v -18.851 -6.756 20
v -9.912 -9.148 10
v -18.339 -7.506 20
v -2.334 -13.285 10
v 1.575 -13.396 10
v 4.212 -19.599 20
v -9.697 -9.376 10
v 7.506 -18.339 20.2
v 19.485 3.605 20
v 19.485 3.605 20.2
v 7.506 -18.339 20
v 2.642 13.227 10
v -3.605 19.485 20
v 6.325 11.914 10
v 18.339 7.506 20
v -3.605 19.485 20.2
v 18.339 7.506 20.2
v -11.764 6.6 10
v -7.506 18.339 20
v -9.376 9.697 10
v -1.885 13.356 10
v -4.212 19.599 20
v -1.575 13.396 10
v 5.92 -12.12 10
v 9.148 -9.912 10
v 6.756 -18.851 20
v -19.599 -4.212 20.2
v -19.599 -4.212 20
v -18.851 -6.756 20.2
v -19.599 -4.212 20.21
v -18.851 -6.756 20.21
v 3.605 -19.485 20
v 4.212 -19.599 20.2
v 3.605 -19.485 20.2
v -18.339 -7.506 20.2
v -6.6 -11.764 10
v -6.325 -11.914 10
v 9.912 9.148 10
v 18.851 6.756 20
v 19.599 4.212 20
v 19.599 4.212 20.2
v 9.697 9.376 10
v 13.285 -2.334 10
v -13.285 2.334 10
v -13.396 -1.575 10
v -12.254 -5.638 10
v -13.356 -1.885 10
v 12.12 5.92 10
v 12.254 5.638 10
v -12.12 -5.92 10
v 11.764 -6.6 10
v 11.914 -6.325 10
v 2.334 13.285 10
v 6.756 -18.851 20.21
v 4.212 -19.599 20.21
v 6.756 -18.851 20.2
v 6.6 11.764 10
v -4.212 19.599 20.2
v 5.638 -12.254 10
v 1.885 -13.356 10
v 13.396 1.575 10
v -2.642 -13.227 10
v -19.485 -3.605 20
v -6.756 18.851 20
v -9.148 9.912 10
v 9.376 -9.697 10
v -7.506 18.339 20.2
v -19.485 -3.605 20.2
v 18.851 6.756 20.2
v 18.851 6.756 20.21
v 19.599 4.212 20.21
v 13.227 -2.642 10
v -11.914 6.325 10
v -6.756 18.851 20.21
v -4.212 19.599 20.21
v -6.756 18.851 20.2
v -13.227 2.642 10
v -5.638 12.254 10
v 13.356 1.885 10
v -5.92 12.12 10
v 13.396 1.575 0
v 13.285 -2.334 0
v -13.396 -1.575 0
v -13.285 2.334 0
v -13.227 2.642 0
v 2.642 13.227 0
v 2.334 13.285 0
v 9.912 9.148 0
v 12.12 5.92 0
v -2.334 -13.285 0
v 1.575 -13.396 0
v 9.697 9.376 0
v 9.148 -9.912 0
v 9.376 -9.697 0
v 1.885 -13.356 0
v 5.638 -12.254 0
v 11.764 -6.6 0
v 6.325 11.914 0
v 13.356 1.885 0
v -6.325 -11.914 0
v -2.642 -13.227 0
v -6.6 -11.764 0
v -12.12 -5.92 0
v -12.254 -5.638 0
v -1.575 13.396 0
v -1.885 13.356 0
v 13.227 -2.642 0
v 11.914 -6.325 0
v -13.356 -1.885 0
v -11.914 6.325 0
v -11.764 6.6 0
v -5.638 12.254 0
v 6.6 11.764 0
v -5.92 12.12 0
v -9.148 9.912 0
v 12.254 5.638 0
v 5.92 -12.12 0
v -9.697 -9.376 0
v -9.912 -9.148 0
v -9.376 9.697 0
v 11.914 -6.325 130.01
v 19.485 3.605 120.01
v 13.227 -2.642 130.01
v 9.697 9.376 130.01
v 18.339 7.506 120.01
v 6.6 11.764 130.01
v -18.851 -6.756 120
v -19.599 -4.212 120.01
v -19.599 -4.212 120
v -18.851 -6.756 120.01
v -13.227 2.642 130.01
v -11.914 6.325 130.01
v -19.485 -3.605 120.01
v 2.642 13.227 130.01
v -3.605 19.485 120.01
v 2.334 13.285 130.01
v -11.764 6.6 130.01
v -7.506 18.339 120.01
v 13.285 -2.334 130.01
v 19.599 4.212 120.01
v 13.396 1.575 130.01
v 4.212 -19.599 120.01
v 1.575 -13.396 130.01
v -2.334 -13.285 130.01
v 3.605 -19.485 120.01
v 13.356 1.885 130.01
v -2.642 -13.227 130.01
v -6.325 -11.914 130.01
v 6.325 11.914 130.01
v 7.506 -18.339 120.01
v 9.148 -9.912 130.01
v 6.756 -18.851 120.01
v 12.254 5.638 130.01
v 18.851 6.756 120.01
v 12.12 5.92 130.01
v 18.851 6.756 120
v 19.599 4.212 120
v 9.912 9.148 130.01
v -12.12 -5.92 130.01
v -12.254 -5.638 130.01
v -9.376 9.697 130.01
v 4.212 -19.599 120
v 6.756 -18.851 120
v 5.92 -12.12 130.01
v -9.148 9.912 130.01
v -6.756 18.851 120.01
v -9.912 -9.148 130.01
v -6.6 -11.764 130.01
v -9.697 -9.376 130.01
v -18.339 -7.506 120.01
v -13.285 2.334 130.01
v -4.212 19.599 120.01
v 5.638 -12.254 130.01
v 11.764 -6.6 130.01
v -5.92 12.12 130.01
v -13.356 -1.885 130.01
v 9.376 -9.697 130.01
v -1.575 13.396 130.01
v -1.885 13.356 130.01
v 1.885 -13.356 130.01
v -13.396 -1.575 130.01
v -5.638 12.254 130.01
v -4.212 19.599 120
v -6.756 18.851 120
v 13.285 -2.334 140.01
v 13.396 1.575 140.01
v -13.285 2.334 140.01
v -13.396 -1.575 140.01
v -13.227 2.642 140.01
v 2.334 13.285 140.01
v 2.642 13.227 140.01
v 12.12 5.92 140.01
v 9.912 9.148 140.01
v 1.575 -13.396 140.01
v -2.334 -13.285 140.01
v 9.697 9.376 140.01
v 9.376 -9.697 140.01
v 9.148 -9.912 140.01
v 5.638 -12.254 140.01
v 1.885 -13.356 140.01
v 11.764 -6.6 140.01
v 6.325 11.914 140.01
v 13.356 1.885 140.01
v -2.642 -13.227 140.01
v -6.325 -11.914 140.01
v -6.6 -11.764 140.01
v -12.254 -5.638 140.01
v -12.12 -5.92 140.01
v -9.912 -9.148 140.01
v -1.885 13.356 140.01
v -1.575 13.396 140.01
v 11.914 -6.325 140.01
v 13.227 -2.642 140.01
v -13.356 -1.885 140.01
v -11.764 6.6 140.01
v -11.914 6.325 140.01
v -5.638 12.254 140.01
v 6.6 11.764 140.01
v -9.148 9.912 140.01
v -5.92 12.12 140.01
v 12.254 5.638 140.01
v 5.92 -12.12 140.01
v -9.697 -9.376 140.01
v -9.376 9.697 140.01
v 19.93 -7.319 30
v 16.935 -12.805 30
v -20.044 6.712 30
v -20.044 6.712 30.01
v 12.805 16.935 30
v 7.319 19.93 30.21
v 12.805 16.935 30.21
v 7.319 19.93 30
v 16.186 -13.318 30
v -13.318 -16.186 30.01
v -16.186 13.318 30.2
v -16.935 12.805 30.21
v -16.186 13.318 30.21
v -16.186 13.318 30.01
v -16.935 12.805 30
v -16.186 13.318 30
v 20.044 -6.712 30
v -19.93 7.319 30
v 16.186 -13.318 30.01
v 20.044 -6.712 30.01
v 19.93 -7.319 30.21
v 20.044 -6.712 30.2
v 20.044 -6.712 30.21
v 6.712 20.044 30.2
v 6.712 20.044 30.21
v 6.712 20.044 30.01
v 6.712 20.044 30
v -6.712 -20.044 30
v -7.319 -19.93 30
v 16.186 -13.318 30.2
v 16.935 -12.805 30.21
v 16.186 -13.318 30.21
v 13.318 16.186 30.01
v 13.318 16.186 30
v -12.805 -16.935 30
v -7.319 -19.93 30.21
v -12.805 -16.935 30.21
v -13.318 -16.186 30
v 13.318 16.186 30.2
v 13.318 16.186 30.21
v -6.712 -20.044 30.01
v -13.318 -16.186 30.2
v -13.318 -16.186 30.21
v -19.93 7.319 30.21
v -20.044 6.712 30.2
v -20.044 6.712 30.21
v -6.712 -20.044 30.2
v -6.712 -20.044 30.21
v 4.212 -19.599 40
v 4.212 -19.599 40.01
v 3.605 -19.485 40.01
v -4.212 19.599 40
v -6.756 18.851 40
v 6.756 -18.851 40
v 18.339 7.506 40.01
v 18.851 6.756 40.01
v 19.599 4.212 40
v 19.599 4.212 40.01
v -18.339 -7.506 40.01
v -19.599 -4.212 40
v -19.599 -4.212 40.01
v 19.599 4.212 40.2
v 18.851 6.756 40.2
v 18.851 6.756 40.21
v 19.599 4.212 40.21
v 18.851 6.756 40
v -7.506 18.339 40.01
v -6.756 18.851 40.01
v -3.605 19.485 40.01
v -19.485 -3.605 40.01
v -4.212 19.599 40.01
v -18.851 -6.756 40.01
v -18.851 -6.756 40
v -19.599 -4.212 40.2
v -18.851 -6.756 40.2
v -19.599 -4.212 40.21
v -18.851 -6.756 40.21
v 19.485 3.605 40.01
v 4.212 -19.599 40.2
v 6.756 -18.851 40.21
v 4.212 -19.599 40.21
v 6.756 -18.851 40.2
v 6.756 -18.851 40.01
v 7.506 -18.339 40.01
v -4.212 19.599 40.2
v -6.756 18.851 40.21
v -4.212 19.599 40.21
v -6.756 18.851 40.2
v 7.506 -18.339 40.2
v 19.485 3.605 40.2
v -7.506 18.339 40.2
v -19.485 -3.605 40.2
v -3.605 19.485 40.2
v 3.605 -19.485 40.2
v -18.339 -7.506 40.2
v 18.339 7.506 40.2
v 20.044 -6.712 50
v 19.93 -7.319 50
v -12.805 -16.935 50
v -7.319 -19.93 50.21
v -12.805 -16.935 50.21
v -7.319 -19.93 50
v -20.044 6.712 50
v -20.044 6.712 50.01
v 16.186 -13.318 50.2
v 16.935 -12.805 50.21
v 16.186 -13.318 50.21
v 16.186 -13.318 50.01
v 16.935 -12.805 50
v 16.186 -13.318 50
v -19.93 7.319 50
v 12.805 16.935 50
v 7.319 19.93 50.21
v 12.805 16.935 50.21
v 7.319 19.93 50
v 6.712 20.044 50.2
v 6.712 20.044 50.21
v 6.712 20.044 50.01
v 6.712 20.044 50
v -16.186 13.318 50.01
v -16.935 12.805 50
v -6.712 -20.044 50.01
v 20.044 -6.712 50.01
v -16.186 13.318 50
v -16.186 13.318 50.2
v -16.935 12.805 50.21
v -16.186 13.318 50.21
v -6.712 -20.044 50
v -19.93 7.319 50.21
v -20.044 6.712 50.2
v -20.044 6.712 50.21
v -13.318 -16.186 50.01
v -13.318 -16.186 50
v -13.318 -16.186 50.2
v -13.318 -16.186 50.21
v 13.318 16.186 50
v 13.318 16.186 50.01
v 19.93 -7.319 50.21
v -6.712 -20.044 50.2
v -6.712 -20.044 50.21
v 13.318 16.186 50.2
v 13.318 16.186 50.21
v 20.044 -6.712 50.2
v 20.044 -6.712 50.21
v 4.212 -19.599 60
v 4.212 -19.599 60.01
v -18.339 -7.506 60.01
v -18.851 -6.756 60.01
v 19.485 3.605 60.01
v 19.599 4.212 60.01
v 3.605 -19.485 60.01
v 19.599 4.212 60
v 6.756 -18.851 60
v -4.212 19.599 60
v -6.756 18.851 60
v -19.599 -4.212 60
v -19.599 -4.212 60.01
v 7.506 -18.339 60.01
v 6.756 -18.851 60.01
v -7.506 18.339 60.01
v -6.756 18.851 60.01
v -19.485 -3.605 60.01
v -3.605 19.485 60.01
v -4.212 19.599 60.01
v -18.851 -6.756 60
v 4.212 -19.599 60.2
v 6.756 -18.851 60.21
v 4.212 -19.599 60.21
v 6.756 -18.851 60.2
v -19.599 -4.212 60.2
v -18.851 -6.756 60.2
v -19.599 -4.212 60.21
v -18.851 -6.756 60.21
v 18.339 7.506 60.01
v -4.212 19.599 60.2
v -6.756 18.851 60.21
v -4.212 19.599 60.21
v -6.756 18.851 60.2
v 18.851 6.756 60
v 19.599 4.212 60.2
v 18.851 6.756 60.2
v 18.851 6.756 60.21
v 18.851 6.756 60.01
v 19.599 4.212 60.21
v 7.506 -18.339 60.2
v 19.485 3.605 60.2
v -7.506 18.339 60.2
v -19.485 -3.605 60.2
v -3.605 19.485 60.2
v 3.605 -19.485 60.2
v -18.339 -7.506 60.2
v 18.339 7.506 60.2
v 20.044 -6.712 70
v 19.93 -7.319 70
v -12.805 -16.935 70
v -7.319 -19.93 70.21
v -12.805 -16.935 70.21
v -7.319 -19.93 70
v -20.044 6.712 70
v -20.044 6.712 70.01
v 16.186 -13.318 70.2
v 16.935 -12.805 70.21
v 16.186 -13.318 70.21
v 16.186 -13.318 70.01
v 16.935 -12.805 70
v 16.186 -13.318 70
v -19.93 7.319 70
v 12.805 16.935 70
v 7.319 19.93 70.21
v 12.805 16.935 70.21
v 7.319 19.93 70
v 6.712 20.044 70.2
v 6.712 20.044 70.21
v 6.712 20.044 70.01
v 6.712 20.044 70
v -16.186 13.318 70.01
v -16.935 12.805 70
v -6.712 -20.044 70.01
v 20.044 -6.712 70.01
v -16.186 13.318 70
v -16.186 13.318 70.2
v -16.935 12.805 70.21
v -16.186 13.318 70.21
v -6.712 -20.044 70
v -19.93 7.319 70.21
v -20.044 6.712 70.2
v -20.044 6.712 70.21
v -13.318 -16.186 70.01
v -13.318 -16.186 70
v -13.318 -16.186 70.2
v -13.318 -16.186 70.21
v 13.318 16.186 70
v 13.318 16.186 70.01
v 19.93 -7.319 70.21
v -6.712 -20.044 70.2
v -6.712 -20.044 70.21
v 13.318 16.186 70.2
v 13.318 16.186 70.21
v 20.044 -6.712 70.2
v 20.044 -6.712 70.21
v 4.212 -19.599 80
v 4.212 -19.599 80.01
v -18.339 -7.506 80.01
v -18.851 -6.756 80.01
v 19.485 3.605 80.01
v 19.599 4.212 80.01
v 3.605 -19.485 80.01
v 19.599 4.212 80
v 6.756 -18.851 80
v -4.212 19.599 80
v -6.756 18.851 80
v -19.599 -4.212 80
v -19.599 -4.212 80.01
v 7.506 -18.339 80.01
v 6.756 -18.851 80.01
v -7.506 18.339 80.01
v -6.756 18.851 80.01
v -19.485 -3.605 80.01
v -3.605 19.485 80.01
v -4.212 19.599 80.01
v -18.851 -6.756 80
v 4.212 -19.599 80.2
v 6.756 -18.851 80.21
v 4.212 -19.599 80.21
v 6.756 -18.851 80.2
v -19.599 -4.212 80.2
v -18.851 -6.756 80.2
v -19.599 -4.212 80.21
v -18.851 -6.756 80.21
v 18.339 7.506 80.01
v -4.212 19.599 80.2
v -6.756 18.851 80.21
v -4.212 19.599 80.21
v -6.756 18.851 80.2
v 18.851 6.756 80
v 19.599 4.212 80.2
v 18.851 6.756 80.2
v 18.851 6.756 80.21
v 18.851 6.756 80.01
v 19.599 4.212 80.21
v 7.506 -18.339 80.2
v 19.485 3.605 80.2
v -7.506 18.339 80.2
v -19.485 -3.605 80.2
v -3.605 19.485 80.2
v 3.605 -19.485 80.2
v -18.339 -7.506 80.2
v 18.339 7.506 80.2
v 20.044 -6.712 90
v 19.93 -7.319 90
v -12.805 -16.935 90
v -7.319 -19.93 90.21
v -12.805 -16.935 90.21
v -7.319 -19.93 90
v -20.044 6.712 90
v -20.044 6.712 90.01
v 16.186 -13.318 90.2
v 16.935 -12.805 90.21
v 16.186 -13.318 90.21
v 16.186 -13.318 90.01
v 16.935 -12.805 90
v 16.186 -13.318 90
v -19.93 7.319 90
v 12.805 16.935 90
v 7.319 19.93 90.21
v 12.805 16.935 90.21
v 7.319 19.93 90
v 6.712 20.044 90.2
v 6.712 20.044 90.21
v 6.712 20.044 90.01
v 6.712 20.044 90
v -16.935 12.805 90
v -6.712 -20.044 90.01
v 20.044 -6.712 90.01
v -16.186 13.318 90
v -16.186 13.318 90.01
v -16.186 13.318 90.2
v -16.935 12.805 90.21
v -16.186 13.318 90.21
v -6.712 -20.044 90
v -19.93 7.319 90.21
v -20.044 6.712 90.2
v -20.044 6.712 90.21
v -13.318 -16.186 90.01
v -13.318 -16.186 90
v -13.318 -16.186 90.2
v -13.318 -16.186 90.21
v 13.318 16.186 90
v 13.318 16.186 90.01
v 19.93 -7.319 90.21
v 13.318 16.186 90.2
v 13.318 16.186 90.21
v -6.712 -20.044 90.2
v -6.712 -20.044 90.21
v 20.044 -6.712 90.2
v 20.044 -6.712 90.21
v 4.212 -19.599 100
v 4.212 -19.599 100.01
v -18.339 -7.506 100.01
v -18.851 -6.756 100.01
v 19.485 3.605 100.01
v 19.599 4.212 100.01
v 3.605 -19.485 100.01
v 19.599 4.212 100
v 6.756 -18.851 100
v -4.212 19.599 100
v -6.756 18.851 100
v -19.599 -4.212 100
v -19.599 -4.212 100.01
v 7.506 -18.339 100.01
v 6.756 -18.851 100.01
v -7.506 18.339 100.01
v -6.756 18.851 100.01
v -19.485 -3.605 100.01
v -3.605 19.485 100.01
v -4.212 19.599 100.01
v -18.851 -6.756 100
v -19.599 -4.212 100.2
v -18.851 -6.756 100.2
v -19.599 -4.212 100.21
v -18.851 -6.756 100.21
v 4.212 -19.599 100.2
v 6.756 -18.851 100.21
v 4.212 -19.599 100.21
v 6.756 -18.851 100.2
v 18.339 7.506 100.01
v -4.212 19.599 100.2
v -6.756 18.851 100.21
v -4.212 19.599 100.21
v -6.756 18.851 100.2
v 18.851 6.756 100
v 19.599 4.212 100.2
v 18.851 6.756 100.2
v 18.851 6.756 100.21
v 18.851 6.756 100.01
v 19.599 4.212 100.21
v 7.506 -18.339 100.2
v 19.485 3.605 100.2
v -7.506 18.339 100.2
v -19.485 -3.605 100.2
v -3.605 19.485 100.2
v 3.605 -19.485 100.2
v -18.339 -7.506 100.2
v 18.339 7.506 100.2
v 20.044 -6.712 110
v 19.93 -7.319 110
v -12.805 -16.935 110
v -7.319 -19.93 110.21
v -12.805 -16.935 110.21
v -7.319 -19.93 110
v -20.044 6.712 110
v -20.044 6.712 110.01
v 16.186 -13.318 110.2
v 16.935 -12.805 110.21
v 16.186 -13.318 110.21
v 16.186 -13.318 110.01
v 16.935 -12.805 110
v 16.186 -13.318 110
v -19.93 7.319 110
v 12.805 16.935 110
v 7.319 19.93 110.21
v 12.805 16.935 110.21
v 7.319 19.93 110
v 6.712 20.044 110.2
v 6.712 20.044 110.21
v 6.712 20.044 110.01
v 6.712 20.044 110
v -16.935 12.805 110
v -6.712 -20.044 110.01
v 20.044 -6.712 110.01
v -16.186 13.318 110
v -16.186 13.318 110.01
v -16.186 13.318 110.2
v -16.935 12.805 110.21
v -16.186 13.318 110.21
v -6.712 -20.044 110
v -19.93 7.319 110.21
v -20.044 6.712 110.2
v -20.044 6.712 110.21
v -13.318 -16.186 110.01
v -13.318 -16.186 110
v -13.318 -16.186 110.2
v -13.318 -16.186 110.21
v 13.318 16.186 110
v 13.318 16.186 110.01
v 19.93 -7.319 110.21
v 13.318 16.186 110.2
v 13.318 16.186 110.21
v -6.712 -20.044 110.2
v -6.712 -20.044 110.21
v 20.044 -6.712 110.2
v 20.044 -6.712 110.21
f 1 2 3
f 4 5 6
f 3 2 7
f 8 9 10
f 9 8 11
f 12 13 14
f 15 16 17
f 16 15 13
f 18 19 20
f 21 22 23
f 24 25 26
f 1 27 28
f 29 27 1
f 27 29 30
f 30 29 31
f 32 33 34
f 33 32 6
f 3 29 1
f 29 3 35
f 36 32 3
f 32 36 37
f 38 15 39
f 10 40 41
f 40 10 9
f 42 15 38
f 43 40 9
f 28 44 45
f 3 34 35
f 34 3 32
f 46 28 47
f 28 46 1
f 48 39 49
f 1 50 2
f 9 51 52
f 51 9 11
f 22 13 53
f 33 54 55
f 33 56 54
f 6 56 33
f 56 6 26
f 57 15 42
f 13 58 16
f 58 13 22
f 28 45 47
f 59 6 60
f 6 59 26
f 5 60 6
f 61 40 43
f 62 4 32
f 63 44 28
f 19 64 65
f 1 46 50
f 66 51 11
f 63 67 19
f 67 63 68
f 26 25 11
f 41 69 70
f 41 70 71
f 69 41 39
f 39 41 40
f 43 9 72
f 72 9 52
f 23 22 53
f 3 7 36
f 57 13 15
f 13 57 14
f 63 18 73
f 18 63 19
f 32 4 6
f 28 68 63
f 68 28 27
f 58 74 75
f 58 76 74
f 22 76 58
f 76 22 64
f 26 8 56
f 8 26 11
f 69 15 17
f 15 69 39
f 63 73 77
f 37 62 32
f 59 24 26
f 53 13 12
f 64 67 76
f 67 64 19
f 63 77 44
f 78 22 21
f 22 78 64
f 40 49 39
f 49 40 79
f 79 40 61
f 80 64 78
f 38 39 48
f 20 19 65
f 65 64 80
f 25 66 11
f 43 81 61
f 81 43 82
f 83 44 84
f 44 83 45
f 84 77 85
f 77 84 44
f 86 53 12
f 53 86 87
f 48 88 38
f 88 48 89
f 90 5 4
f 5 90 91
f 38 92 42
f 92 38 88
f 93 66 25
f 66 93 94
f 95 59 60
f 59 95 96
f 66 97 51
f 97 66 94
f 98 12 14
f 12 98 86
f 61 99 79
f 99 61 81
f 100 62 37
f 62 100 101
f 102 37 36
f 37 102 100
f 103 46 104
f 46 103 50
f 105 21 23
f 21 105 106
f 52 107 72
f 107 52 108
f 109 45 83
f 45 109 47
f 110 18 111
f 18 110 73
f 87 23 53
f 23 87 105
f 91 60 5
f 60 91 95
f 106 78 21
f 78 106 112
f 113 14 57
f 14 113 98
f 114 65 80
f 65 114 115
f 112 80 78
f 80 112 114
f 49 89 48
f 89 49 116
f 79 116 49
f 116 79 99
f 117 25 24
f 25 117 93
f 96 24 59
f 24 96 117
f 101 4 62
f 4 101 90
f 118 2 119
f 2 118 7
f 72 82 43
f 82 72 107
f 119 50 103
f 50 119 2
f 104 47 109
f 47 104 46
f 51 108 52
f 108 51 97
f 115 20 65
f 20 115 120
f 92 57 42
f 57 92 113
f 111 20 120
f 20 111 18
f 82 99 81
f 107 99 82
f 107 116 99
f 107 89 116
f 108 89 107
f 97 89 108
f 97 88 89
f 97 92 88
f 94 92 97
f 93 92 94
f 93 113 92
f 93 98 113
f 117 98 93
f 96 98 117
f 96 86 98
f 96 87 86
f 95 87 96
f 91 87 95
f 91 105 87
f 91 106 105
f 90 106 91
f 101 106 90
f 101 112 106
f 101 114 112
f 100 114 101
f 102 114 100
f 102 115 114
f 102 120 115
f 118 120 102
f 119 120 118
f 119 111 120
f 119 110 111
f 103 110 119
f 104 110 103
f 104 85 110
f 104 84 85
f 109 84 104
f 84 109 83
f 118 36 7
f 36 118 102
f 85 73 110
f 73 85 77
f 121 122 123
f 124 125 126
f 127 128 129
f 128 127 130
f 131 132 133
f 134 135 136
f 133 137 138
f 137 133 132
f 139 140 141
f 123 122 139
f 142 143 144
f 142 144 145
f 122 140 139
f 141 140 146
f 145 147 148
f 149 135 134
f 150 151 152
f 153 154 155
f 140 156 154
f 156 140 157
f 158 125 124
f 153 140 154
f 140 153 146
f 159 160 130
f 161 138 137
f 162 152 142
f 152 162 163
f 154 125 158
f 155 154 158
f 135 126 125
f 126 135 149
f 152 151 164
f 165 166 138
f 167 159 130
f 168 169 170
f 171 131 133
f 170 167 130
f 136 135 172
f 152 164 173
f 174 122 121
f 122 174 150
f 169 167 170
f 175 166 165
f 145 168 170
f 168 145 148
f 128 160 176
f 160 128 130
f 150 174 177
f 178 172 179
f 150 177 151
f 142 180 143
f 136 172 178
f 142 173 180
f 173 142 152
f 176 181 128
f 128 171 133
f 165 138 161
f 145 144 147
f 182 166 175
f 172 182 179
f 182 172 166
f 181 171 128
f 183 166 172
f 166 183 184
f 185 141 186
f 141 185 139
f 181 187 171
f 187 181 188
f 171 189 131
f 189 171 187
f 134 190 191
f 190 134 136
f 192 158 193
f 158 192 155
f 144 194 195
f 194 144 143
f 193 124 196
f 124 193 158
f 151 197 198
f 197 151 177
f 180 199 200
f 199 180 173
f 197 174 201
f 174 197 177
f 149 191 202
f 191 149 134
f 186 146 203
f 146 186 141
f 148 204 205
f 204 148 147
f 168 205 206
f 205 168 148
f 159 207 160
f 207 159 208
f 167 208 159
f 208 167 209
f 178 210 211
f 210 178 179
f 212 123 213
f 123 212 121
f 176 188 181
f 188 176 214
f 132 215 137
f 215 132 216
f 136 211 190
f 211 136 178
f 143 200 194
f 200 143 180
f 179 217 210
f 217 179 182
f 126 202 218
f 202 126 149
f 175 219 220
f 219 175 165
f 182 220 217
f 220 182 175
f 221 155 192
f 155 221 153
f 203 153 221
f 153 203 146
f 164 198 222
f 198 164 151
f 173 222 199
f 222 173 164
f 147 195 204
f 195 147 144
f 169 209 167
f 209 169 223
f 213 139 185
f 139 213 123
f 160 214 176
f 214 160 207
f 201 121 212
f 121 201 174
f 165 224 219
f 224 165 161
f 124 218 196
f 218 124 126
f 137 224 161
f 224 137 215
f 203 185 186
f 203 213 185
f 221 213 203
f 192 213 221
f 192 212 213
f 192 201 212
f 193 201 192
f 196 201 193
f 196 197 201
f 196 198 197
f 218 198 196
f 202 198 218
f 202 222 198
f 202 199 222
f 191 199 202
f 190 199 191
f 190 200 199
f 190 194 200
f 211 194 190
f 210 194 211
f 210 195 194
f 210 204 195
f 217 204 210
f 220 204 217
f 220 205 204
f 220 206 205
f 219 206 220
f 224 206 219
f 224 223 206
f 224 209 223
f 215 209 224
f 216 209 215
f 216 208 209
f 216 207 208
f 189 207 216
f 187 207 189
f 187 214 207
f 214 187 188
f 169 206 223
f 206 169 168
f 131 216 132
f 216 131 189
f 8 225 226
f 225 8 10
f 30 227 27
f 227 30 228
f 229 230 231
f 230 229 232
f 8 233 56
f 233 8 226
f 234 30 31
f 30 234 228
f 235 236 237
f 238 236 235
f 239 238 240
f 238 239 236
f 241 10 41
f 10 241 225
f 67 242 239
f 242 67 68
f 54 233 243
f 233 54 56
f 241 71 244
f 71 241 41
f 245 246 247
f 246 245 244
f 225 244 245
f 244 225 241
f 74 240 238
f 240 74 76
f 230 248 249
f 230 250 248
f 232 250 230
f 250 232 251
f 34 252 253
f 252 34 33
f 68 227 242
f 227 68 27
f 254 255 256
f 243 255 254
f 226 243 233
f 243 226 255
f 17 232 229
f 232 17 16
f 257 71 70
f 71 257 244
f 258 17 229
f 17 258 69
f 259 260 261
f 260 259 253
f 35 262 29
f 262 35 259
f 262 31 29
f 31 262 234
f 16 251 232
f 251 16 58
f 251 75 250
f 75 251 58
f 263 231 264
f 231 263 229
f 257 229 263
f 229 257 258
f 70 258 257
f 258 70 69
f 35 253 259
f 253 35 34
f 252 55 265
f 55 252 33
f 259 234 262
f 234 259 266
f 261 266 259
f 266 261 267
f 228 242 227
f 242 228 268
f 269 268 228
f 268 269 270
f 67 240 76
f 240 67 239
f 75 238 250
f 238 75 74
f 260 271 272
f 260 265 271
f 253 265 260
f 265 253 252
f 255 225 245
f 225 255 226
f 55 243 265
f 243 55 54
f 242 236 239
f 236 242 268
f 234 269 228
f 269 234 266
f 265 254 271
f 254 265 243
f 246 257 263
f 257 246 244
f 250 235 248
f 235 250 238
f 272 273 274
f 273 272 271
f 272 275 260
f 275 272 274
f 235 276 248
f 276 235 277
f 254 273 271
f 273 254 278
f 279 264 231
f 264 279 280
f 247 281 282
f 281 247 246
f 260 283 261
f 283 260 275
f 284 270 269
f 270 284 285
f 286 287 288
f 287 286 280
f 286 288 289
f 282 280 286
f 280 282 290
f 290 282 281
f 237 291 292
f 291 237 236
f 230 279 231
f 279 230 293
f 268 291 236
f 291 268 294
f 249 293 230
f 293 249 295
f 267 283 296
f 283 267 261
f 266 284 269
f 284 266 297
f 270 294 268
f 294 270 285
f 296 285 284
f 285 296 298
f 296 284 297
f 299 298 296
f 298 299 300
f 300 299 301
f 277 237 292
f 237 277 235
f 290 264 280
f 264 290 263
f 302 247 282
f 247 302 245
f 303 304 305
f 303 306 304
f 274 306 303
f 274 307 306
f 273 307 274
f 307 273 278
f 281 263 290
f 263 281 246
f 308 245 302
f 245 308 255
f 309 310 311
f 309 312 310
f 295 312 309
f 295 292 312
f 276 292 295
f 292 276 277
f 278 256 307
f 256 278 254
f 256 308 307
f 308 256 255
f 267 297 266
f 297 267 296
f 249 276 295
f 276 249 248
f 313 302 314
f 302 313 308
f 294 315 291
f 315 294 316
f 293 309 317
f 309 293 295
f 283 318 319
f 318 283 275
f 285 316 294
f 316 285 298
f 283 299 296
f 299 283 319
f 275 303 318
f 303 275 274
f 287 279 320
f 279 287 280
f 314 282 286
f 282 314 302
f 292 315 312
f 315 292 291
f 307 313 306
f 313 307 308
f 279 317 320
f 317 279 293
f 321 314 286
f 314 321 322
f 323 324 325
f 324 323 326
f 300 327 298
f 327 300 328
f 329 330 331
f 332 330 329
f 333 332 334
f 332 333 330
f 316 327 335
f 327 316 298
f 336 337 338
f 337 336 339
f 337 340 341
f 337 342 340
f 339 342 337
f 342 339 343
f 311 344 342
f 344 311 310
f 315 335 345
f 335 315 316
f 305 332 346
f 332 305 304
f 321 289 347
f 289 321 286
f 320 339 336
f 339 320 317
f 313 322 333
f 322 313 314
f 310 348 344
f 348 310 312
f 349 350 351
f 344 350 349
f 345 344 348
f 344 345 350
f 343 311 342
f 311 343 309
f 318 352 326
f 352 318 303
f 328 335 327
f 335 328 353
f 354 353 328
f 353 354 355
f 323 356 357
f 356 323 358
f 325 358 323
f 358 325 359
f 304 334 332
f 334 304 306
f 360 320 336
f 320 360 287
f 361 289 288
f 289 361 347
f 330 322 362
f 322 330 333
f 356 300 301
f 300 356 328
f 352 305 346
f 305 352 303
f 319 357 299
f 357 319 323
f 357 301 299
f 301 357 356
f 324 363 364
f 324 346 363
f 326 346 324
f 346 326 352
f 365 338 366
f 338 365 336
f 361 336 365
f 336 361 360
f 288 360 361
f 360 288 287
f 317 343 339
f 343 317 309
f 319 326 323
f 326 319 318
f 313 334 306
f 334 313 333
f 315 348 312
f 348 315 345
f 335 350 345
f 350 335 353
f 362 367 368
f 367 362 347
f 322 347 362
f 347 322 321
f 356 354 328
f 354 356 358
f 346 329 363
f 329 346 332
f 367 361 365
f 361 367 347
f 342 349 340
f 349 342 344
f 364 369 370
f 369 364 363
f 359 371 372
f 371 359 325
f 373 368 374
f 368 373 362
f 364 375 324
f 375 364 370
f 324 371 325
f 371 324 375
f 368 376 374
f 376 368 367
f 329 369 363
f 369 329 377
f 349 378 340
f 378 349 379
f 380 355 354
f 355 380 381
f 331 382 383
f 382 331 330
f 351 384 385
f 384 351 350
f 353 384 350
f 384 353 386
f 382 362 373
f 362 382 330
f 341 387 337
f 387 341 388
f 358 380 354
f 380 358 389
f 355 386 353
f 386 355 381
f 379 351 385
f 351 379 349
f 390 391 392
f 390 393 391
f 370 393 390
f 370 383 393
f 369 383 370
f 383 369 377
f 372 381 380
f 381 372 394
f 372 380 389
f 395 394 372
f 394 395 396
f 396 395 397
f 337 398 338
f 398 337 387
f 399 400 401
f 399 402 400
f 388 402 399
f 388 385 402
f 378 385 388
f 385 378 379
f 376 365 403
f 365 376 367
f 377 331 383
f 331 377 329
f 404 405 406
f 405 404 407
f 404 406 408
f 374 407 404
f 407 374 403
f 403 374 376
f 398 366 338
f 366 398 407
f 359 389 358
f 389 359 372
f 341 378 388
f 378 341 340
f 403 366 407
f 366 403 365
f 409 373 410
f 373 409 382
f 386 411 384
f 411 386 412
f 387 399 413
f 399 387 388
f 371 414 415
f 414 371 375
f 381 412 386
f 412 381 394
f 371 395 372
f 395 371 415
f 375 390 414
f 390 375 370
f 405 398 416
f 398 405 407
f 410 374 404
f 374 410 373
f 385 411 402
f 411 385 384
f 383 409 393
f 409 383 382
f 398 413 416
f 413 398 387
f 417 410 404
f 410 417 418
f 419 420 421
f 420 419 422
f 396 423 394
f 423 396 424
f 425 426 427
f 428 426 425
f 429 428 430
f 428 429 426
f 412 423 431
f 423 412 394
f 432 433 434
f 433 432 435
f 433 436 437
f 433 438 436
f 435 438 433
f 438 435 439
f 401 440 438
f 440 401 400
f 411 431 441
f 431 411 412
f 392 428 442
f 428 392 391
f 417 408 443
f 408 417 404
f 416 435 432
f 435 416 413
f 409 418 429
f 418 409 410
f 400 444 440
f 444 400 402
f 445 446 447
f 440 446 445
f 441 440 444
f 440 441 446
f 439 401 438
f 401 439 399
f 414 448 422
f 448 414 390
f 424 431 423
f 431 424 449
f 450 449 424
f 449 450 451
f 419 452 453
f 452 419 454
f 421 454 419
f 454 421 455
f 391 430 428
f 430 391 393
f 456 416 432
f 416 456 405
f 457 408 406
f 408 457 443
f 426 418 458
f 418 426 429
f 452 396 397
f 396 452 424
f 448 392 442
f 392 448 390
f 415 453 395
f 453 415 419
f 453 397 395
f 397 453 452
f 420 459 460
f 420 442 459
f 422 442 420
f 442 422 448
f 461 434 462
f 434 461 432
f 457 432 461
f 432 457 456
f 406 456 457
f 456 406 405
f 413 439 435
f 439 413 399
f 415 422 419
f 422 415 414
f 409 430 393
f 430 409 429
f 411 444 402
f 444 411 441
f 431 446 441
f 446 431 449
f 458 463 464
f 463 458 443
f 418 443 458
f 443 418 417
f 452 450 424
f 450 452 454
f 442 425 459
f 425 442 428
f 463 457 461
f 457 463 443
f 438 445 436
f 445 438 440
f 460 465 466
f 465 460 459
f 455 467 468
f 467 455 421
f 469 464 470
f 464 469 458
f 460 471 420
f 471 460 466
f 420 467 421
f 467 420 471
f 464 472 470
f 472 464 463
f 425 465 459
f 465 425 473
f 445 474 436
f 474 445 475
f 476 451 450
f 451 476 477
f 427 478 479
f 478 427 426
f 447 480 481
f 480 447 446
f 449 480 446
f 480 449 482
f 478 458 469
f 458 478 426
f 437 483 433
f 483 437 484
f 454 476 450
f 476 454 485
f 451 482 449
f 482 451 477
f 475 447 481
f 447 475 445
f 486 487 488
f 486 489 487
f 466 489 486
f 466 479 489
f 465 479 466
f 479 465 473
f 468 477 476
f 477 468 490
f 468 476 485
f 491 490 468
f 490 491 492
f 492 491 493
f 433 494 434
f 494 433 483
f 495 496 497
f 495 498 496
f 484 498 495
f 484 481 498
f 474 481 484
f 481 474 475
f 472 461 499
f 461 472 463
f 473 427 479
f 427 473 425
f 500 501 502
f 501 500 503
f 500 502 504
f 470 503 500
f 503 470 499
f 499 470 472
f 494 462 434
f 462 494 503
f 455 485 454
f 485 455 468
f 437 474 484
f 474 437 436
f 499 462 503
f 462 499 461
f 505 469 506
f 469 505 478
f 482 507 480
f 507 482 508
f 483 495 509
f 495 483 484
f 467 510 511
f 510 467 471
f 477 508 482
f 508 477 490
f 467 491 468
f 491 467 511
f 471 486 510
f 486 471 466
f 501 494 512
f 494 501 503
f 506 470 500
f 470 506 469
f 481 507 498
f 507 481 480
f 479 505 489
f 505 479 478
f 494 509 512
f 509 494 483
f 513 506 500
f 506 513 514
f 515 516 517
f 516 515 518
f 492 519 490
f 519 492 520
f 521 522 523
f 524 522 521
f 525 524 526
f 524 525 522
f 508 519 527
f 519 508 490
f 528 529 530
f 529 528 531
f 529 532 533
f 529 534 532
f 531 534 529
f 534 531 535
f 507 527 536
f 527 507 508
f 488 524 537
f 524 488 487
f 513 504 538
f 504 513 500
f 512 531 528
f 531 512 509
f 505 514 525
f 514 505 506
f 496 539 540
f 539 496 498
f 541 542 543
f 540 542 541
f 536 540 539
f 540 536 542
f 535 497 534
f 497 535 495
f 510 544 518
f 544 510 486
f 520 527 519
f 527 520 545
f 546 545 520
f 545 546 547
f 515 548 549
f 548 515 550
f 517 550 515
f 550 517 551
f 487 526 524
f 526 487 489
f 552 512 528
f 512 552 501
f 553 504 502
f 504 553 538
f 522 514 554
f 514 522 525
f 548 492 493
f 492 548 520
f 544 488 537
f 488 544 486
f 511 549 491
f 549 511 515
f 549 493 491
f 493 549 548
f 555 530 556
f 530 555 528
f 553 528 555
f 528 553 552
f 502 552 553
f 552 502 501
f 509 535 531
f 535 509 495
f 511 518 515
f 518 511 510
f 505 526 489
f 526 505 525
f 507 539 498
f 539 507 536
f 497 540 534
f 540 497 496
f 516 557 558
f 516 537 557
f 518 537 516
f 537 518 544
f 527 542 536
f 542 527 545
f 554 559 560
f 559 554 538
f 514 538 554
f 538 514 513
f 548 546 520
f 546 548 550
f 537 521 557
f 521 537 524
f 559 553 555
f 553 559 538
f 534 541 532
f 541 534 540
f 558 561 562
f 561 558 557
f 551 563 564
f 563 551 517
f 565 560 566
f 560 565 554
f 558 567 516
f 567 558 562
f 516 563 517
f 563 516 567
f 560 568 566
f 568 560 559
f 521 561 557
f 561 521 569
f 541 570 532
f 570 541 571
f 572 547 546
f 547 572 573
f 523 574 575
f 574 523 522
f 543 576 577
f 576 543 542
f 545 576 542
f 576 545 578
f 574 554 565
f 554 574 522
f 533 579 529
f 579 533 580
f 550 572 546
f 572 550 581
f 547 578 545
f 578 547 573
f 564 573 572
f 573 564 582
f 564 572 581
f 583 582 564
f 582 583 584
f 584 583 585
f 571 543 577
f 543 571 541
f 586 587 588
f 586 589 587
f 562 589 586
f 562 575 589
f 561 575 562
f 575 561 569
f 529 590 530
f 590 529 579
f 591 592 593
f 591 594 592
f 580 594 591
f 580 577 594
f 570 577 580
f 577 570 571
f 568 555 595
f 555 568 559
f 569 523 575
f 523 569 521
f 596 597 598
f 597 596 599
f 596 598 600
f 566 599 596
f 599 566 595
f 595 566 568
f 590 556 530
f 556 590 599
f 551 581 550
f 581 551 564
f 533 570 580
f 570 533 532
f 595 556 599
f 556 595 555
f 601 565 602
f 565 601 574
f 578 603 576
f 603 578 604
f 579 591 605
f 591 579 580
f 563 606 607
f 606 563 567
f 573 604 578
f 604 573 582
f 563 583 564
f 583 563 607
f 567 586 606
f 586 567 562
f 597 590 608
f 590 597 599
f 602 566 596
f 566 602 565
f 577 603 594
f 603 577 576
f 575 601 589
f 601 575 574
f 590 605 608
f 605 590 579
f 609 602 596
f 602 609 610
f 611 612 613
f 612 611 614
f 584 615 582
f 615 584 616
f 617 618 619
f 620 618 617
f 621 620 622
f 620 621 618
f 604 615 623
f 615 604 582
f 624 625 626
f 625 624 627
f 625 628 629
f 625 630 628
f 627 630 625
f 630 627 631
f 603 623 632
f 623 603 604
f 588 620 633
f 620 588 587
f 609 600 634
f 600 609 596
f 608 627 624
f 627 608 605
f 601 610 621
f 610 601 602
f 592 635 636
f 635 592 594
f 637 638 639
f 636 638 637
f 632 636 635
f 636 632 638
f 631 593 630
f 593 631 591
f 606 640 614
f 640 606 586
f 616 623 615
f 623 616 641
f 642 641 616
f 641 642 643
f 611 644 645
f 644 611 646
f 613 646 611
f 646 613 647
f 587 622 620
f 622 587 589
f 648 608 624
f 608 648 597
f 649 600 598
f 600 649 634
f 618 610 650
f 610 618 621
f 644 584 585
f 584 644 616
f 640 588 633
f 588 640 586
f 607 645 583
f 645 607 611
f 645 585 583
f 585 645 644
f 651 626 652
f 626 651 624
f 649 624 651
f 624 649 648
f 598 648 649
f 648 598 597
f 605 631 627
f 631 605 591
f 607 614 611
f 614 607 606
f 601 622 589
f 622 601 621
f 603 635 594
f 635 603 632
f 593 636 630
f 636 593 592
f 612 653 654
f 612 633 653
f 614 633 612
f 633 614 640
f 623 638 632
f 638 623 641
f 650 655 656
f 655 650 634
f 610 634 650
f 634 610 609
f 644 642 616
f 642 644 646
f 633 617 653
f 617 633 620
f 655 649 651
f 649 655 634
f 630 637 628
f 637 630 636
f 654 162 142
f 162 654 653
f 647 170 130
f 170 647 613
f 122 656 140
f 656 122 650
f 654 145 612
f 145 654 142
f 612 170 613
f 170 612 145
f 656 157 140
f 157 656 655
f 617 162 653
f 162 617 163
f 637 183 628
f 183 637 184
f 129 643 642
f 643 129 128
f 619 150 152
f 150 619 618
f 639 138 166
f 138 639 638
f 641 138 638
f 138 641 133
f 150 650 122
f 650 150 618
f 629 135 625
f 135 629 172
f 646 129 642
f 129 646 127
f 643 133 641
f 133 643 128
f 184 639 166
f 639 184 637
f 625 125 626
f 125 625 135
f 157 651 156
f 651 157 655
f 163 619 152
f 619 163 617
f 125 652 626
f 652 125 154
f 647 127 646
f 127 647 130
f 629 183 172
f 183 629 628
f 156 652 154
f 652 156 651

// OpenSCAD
x = 25;
y = 25;
approx_z = 100;
steps = 10;
step = round(approx_z  / steps);
z=step*steps;
step2 = floor(step * 2);
ext = 1.5;
radi = 1;
verticalsegment = 0.2;
sleeve = 20;
sleeve_ext = 0;
sleeveext = sleeve*sleeve_ext;
sleeveFN = 20;

hx=x/2;
hy=y/2;
rotate([0,0,rnd(360)]){
sleeves();
body();
}
echo (ext);
module sleeves() {
  hull() {
    translate([0, 0, verticalsegment+  sleeve]) plane(x, y, 0);
    translate([0, 0,   sleeve]) plane(x, y, 0);
    translate([0, 0, sleeve- min(step,sleeve*0.5)]) sleeve(x, y);
  }
  hull() {
    translate([0, 0, sleeve- min(step,sleeve*0.5)]) sleeve(x, y);
    translate([0, 0, 0]) sleeve(x, y);
  }

  hull() {
    translate([0, 0, sleeve]) plane(x, y, z);
    translate([0, 0, z + sleeve + min(step,sleeve*0.5)]) sleeve(x, y);
  }
  hull() {
    translate([0, 0, z + sleeve + sleeve]) sleeve(x, y);
    translate([0, 0, z + sleeve + min(step,sleeve*0.5)]) sleeve(x, y);
  }
}
module body() {
  for (i = [0: step: z - step]) {
    hull() {
      translate([0, 0, verticalsegment + sleeve]) plane(x, y, i);
      translate([0, 0, sleeve]) plane(x, y, i);
    }
    hull() {
      translate([0, 0, verticalsegment + sleeve]) plane(x, y, i);
      translate([0, 0, sleeve]) plane(x, y, i + step);
    }
  }
}
module plane(x, y, z) {
  translate([0, 0, z]) linear_extrude(0.01) offset(r = radi, $fn = 10){
 square([x -hx * ext + ext*((z +step ) % step2) * ext, y + ((z  ) % step2) * ext], center = true);
 square([x + ((z ) % step2) * ext, y   -hy*ext+ ext*((z +step ) % step2) * ext ], center = true);
}
}
module sleeve(x, y) {
  translate([0, 0, 0]) linear_extrude(0.01) offset(r = radi, $fn = 10) scale([x + sleeveext * 2, y + sleeveext * 2])circle(0.5,$fn=sleeveFN);}

function rnd(a=0,b=1)=(rands(min(a,b),max(a,b),1)[0]);
